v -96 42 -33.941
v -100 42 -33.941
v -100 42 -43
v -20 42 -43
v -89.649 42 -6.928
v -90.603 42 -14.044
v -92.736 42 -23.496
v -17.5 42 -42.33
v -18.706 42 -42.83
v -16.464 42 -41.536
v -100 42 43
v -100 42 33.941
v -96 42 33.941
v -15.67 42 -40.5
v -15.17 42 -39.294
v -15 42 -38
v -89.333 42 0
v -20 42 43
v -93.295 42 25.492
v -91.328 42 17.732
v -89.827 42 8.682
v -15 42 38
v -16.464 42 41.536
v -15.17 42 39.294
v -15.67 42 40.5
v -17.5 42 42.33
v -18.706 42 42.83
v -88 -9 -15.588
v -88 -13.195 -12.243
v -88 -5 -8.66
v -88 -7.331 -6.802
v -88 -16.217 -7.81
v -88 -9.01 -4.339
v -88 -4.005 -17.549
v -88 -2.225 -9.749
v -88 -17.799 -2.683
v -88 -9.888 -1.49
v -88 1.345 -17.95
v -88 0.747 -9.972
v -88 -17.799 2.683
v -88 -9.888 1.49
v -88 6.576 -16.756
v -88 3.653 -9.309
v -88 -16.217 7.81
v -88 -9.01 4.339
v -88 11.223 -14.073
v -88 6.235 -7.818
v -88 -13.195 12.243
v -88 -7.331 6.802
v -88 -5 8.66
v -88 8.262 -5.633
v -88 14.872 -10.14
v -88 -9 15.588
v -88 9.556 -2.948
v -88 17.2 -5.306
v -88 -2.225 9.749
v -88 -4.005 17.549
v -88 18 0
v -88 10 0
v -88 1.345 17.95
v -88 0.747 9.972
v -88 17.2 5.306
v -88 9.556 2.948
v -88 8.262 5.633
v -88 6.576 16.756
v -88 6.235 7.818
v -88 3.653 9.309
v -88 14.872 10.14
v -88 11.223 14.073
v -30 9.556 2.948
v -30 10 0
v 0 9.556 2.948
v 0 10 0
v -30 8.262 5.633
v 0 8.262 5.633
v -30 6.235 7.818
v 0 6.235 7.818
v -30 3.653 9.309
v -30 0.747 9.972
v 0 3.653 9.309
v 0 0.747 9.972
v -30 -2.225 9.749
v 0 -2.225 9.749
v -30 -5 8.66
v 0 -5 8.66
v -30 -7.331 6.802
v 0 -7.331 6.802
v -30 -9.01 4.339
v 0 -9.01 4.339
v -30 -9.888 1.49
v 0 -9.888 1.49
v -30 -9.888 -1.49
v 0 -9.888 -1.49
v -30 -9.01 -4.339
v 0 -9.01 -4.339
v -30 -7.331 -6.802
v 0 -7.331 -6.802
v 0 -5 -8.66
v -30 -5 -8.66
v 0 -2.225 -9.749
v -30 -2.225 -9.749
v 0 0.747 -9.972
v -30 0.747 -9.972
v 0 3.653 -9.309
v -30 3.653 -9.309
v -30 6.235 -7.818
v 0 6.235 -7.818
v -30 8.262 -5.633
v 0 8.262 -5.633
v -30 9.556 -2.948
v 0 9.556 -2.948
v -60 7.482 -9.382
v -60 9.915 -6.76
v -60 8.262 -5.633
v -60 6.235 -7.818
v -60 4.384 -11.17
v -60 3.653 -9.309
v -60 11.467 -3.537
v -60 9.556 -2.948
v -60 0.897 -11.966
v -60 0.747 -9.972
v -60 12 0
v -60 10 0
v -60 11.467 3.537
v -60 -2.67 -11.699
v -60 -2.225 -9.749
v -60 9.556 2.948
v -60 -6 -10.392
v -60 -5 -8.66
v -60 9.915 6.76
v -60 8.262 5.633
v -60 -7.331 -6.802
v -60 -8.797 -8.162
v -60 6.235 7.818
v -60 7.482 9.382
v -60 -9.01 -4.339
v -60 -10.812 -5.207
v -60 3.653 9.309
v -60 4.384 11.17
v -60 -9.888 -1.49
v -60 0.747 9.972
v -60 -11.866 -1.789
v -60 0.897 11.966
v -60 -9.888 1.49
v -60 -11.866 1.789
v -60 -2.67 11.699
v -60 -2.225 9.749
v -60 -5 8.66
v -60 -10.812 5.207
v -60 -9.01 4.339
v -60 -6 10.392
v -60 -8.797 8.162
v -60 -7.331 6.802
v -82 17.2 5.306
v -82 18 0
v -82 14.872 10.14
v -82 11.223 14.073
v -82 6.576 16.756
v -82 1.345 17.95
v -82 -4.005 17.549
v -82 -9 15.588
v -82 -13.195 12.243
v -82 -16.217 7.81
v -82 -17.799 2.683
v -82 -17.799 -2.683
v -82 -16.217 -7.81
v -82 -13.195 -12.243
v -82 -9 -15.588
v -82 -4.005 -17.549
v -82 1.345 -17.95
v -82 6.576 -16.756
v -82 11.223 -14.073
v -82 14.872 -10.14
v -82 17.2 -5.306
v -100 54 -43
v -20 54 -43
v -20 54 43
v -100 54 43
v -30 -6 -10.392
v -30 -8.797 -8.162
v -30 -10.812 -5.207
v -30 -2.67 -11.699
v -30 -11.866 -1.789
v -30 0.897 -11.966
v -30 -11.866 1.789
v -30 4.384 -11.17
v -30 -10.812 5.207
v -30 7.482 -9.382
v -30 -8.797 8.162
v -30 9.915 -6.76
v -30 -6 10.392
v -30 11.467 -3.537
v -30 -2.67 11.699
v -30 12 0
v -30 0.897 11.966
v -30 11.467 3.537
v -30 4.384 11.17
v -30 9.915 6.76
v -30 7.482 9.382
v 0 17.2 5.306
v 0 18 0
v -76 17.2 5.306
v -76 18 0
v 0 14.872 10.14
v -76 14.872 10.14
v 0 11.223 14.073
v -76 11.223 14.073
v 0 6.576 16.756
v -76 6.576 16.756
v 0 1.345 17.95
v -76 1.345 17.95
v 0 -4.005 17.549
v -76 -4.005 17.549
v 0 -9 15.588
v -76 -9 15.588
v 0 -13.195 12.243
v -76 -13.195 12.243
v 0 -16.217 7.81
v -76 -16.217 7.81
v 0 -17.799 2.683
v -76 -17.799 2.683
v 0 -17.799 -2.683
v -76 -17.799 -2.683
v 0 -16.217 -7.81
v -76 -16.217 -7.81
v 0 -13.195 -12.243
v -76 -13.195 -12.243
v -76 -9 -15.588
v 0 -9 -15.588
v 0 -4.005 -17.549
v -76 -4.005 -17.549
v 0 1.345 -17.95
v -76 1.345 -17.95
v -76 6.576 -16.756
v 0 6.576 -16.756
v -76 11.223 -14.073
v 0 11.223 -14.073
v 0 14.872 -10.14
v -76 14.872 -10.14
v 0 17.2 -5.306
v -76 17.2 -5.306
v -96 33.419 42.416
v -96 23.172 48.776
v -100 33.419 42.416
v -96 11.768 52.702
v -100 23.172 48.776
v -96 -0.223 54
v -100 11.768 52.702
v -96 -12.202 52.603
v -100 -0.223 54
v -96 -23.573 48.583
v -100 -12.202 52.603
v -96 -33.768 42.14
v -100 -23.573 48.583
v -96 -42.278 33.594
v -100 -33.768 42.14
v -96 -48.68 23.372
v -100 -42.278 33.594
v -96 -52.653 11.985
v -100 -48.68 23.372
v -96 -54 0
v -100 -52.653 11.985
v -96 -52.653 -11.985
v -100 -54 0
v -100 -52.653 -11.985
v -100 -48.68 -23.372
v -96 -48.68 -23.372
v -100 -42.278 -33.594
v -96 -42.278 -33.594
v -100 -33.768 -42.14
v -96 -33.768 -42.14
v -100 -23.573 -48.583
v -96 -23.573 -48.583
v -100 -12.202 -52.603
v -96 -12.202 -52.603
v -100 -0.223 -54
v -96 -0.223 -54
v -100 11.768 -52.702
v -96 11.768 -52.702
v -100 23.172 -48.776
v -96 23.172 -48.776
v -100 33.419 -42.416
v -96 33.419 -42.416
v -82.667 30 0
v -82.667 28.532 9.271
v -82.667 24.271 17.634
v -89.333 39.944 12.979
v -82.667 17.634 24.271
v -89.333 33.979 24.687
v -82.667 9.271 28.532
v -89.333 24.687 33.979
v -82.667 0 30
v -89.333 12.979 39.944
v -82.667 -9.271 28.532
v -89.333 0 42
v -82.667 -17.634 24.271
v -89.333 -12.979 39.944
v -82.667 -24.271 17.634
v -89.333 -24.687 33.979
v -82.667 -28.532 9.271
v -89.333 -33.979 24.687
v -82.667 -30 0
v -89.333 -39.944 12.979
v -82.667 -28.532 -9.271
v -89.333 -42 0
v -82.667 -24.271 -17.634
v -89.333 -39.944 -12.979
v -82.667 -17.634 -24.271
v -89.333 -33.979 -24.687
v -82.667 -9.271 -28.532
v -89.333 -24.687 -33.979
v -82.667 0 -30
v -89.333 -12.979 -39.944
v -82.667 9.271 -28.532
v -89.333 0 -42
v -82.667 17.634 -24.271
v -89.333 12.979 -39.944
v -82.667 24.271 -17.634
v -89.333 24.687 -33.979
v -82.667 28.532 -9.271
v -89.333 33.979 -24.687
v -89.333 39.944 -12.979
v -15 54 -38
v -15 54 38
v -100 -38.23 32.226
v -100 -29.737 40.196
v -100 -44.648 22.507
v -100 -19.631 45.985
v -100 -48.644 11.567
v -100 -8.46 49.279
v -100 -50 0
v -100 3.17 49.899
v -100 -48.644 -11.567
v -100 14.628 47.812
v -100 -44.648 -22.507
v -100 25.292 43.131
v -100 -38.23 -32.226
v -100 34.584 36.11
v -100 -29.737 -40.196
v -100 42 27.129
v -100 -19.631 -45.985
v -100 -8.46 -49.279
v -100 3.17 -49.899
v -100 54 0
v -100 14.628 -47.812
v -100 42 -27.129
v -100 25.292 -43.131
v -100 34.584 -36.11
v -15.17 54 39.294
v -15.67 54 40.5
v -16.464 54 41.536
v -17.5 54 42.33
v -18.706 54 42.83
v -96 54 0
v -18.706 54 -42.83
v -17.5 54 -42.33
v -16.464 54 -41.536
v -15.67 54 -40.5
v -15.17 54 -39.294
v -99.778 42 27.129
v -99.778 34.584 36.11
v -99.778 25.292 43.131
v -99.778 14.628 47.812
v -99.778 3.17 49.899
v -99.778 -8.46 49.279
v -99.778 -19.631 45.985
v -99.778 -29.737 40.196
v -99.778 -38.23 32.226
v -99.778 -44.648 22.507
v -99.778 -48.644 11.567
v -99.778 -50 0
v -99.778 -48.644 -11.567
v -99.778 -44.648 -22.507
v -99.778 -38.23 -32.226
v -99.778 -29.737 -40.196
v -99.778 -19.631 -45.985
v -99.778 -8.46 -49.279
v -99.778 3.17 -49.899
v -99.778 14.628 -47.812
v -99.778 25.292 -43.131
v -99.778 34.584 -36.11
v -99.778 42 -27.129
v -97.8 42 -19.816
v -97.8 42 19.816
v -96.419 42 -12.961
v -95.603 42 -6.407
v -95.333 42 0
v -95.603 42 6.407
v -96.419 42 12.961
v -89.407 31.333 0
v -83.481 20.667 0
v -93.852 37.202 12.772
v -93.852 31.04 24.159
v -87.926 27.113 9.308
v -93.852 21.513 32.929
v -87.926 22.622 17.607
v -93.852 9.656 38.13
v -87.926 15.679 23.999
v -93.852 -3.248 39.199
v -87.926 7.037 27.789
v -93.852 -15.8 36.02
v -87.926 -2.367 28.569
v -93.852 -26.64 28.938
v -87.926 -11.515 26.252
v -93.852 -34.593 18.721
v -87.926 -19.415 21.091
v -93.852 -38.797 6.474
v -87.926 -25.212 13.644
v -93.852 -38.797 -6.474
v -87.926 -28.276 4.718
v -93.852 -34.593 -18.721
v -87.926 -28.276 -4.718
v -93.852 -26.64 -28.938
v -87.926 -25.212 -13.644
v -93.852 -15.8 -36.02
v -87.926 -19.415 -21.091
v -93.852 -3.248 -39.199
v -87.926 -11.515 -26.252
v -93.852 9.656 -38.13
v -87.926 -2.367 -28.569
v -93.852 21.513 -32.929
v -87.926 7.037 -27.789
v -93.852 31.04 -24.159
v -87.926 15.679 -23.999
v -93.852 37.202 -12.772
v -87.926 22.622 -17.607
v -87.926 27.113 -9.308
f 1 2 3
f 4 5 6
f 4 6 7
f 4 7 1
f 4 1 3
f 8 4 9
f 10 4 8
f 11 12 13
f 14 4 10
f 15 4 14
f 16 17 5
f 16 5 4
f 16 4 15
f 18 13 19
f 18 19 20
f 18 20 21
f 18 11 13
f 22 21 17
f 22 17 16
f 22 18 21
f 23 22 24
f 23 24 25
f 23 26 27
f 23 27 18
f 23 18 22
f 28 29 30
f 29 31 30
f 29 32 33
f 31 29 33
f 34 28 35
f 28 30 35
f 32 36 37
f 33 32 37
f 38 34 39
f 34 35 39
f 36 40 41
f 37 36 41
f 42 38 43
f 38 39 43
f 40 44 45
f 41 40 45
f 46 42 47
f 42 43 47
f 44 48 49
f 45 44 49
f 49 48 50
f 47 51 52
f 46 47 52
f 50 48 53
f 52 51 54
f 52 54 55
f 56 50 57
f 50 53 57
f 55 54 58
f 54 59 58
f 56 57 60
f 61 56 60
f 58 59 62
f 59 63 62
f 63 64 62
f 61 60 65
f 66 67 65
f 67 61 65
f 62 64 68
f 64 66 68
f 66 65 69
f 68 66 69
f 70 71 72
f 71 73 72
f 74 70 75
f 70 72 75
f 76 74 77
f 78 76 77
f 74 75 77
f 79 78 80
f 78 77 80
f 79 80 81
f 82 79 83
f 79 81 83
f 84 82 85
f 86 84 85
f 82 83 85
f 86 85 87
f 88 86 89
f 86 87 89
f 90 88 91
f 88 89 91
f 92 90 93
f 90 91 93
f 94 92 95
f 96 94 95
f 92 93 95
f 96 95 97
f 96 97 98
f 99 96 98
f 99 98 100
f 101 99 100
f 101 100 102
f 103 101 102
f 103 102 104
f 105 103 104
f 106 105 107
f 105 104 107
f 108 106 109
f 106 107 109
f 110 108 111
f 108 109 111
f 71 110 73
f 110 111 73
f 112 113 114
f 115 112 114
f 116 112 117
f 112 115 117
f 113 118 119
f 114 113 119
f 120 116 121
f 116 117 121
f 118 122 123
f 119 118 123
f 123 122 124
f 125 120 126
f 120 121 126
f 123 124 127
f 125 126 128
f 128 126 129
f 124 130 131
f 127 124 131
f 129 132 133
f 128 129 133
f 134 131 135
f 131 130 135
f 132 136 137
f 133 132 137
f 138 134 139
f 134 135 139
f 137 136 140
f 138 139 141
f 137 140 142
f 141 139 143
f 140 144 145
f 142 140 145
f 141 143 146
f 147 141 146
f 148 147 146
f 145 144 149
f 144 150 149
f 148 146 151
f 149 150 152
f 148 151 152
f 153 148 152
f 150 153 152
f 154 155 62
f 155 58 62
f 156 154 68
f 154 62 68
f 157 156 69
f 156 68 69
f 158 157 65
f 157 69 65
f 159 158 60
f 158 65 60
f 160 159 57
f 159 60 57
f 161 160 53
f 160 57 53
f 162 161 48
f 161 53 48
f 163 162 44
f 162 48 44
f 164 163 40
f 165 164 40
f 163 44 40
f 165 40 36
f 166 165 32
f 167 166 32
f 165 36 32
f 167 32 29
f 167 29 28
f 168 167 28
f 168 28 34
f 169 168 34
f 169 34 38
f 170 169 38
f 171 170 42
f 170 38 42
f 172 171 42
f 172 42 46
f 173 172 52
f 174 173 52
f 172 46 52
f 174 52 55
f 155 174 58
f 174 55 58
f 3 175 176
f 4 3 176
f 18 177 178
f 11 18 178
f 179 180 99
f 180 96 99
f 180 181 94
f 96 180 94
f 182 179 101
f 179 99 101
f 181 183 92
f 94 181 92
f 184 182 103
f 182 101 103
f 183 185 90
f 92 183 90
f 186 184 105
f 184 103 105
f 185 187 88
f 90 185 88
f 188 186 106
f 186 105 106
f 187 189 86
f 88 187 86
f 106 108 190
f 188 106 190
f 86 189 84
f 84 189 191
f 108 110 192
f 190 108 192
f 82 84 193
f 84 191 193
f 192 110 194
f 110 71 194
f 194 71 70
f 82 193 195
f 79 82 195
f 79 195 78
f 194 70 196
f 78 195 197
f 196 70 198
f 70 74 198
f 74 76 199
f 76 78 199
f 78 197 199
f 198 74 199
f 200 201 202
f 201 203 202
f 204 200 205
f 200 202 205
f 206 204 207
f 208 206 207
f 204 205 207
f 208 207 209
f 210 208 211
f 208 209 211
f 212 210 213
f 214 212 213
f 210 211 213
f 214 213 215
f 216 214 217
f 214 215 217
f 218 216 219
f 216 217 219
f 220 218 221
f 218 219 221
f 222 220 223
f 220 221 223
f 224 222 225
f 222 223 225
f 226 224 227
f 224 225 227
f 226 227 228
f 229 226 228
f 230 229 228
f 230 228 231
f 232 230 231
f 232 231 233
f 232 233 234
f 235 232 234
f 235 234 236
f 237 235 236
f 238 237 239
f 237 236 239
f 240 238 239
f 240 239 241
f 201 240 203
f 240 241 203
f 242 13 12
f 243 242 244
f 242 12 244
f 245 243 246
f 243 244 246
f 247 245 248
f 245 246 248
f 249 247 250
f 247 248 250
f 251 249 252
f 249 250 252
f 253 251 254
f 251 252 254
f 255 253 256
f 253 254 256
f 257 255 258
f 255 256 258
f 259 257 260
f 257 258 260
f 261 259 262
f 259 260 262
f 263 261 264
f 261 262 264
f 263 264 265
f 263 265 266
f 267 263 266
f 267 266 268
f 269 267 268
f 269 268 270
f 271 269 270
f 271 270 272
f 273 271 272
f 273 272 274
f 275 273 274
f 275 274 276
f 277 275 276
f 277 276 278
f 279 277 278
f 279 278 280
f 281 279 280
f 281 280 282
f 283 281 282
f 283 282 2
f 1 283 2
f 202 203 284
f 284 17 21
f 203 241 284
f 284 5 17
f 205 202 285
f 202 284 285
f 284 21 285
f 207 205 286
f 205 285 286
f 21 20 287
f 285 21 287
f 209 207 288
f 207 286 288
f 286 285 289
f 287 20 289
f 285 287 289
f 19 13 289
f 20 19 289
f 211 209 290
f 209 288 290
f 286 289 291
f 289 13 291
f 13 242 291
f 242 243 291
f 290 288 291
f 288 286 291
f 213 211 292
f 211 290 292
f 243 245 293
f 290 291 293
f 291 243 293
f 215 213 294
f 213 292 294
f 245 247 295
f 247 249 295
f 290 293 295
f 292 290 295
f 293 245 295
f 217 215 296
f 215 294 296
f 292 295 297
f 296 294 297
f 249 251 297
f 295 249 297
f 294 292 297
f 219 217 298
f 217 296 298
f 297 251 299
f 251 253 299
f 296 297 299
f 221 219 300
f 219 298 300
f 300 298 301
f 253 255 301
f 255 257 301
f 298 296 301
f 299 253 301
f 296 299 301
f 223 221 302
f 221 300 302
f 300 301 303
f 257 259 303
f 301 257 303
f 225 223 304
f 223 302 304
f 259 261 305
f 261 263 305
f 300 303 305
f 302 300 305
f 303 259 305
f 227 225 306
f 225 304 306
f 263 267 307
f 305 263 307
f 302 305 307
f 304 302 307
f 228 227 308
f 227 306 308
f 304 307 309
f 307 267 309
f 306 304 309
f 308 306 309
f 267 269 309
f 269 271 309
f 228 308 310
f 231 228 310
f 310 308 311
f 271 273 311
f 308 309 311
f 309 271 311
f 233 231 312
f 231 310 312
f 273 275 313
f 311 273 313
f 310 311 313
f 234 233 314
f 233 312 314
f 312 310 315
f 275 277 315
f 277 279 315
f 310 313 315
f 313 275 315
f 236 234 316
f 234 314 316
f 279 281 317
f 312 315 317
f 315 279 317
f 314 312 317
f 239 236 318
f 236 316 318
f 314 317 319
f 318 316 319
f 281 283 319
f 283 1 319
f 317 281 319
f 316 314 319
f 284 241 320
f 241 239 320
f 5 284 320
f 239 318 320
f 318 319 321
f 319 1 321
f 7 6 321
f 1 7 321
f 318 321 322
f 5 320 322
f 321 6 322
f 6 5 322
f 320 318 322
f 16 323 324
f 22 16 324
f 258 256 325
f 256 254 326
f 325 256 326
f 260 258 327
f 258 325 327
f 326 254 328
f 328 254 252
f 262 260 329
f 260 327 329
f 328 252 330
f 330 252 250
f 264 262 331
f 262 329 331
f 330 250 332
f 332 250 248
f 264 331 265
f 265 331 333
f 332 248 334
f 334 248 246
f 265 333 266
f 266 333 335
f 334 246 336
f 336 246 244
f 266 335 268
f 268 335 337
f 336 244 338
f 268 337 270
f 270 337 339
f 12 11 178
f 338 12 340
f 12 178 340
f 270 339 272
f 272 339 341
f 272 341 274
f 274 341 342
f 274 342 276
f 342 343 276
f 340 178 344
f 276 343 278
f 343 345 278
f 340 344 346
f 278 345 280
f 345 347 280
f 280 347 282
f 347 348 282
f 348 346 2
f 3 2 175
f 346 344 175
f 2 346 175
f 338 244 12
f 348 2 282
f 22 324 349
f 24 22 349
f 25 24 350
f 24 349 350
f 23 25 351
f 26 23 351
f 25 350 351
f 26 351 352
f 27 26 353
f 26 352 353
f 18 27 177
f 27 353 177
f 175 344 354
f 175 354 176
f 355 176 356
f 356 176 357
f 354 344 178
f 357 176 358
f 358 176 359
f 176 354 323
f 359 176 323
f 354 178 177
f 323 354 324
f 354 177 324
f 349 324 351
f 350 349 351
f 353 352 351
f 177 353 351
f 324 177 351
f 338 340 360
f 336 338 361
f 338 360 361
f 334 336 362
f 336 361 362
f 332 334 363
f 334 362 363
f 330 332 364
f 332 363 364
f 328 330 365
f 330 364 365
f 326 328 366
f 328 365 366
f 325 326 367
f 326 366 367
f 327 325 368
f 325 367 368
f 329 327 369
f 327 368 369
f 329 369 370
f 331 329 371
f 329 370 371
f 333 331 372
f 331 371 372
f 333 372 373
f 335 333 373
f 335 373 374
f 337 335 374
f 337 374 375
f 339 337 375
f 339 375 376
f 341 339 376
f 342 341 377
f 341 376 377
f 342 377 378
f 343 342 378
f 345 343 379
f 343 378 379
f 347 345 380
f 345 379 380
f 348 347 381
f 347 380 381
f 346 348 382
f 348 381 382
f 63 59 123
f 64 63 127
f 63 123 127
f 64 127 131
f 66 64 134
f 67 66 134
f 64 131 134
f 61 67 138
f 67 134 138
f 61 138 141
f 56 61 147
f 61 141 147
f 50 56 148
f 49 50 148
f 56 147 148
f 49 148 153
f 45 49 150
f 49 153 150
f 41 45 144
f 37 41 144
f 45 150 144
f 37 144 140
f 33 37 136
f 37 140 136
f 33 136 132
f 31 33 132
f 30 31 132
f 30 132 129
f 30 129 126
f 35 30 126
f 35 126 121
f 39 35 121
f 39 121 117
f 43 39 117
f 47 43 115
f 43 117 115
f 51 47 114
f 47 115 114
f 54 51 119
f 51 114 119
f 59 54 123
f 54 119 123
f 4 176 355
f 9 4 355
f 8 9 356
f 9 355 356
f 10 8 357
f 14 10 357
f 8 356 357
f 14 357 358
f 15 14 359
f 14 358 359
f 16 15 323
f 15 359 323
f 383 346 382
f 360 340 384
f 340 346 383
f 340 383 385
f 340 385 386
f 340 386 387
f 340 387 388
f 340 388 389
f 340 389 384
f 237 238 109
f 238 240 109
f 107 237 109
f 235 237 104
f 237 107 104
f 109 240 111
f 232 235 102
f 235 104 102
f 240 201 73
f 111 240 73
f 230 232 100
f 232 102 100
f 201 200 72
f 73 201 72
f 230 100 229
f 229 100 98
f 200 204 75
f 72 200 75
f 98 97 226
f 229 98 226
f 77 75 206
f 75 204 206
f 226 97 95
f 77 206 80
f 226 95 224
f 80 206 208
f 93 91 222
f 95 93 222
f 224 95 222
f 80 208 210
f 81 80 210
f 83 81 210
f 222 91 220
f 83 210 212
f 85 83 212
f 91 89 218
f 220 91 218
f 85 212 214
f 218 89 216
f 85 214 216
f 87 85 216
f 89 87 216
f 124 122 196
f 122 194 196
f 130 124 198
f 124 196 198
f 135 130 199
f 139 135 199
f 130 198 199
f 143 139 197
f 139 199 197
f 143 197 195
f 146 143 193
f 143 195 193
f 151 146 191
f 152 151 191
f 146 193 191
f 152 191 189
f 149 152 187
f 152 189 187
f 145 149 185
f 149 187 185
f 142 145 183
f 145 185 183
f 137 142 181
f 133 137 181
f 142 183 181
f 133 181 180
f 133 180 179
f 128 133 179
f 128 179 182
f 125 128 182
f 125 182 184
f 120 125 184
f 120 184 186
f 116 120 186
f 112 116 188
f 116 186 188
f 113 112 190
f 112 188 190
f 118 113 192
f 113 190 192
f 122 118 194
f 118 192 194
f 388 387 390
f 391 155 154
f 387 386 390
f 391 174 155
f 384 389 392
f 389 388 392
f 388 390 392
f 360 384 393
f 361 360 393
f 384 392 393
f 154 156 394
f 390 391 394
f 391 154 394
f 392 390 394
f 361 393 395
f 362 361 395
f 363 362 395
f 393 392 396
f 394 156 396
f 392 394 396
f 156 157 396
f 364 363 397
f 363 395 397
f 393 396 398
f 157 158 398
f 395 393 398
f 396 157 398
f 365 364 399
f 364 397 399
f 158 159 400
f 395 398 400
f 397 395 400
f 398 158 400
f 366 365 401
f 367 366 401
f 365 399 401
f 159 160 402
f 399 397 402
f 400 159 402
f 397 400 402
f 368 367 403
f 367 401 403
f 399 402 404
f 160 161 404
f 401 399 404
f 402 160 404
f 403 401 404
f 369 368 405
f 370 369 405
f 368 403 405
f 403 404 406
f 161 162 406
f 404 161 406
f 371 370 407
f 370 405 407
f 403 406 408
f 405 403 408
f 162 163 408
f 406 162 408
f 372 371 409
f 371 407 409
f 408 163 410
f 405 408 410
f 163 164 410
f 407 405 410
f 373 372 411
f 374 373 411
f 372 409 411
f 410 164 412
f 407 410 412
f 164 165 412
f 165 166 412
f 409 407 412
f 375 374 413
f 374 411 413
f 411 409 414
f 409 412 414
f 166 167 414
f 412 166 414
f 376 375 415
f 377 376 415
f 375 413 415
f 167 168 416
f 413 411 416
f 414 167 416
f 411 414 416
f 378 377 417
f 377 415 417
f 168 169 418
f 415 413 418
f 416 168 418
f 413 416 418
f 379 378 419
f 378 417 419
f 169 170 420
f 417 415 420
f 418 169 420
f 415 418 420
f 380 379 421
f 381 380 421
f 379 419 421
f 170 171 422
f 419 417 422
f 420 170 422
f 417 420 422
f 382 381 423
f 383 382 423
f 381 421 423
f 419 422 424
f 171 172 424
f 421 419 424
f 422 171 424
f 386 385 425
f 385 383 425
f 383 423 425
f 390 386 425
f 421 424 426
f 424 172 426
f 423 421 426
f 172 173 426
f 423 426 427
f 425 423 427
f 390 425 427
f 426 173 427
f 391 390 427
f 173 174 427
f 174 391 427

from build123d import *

# Parameters (mm, degrees)
F4_DEPTH = 12


with BuildPart() as f1:
    # F0 (on Top) → F1 (revolve)
    with BuildSketch(Plane.XY):
        Polygon((-30, 10), (0, 10), (0, 18), (-76, 18), (-96, 54), (-100, 54), (-100, 50), (-99.777778, 50), (-82, 18), (-88, 18), (-88, 10), (-60, 10), (-60, 12), (-30, 12), align=None)
    revolve(axis=Axis((-50, 0, 0), (1, 0, 0)))

    # F3 (on offset) → F4 (join)
    with BuildSketch(Plane.XZ.offset(-54)):
        with BuildLine():
            Line((-100, 43), (-100, -43))
            Line((-100, -43), (-20, -43))
            ThreePointArc((-20, -43), (-16.464466, -41.535534), (-15, -38))
            Line((-15, -38), (-15, 38))
            ThreePointArc((-15, 38), (-16.464466, 41.535534), (-20, 43))
            Line((-20, 43), (-100, 43))
        make_face()
    extrude(amount=F4_DEPTH)


solid = f1.part
